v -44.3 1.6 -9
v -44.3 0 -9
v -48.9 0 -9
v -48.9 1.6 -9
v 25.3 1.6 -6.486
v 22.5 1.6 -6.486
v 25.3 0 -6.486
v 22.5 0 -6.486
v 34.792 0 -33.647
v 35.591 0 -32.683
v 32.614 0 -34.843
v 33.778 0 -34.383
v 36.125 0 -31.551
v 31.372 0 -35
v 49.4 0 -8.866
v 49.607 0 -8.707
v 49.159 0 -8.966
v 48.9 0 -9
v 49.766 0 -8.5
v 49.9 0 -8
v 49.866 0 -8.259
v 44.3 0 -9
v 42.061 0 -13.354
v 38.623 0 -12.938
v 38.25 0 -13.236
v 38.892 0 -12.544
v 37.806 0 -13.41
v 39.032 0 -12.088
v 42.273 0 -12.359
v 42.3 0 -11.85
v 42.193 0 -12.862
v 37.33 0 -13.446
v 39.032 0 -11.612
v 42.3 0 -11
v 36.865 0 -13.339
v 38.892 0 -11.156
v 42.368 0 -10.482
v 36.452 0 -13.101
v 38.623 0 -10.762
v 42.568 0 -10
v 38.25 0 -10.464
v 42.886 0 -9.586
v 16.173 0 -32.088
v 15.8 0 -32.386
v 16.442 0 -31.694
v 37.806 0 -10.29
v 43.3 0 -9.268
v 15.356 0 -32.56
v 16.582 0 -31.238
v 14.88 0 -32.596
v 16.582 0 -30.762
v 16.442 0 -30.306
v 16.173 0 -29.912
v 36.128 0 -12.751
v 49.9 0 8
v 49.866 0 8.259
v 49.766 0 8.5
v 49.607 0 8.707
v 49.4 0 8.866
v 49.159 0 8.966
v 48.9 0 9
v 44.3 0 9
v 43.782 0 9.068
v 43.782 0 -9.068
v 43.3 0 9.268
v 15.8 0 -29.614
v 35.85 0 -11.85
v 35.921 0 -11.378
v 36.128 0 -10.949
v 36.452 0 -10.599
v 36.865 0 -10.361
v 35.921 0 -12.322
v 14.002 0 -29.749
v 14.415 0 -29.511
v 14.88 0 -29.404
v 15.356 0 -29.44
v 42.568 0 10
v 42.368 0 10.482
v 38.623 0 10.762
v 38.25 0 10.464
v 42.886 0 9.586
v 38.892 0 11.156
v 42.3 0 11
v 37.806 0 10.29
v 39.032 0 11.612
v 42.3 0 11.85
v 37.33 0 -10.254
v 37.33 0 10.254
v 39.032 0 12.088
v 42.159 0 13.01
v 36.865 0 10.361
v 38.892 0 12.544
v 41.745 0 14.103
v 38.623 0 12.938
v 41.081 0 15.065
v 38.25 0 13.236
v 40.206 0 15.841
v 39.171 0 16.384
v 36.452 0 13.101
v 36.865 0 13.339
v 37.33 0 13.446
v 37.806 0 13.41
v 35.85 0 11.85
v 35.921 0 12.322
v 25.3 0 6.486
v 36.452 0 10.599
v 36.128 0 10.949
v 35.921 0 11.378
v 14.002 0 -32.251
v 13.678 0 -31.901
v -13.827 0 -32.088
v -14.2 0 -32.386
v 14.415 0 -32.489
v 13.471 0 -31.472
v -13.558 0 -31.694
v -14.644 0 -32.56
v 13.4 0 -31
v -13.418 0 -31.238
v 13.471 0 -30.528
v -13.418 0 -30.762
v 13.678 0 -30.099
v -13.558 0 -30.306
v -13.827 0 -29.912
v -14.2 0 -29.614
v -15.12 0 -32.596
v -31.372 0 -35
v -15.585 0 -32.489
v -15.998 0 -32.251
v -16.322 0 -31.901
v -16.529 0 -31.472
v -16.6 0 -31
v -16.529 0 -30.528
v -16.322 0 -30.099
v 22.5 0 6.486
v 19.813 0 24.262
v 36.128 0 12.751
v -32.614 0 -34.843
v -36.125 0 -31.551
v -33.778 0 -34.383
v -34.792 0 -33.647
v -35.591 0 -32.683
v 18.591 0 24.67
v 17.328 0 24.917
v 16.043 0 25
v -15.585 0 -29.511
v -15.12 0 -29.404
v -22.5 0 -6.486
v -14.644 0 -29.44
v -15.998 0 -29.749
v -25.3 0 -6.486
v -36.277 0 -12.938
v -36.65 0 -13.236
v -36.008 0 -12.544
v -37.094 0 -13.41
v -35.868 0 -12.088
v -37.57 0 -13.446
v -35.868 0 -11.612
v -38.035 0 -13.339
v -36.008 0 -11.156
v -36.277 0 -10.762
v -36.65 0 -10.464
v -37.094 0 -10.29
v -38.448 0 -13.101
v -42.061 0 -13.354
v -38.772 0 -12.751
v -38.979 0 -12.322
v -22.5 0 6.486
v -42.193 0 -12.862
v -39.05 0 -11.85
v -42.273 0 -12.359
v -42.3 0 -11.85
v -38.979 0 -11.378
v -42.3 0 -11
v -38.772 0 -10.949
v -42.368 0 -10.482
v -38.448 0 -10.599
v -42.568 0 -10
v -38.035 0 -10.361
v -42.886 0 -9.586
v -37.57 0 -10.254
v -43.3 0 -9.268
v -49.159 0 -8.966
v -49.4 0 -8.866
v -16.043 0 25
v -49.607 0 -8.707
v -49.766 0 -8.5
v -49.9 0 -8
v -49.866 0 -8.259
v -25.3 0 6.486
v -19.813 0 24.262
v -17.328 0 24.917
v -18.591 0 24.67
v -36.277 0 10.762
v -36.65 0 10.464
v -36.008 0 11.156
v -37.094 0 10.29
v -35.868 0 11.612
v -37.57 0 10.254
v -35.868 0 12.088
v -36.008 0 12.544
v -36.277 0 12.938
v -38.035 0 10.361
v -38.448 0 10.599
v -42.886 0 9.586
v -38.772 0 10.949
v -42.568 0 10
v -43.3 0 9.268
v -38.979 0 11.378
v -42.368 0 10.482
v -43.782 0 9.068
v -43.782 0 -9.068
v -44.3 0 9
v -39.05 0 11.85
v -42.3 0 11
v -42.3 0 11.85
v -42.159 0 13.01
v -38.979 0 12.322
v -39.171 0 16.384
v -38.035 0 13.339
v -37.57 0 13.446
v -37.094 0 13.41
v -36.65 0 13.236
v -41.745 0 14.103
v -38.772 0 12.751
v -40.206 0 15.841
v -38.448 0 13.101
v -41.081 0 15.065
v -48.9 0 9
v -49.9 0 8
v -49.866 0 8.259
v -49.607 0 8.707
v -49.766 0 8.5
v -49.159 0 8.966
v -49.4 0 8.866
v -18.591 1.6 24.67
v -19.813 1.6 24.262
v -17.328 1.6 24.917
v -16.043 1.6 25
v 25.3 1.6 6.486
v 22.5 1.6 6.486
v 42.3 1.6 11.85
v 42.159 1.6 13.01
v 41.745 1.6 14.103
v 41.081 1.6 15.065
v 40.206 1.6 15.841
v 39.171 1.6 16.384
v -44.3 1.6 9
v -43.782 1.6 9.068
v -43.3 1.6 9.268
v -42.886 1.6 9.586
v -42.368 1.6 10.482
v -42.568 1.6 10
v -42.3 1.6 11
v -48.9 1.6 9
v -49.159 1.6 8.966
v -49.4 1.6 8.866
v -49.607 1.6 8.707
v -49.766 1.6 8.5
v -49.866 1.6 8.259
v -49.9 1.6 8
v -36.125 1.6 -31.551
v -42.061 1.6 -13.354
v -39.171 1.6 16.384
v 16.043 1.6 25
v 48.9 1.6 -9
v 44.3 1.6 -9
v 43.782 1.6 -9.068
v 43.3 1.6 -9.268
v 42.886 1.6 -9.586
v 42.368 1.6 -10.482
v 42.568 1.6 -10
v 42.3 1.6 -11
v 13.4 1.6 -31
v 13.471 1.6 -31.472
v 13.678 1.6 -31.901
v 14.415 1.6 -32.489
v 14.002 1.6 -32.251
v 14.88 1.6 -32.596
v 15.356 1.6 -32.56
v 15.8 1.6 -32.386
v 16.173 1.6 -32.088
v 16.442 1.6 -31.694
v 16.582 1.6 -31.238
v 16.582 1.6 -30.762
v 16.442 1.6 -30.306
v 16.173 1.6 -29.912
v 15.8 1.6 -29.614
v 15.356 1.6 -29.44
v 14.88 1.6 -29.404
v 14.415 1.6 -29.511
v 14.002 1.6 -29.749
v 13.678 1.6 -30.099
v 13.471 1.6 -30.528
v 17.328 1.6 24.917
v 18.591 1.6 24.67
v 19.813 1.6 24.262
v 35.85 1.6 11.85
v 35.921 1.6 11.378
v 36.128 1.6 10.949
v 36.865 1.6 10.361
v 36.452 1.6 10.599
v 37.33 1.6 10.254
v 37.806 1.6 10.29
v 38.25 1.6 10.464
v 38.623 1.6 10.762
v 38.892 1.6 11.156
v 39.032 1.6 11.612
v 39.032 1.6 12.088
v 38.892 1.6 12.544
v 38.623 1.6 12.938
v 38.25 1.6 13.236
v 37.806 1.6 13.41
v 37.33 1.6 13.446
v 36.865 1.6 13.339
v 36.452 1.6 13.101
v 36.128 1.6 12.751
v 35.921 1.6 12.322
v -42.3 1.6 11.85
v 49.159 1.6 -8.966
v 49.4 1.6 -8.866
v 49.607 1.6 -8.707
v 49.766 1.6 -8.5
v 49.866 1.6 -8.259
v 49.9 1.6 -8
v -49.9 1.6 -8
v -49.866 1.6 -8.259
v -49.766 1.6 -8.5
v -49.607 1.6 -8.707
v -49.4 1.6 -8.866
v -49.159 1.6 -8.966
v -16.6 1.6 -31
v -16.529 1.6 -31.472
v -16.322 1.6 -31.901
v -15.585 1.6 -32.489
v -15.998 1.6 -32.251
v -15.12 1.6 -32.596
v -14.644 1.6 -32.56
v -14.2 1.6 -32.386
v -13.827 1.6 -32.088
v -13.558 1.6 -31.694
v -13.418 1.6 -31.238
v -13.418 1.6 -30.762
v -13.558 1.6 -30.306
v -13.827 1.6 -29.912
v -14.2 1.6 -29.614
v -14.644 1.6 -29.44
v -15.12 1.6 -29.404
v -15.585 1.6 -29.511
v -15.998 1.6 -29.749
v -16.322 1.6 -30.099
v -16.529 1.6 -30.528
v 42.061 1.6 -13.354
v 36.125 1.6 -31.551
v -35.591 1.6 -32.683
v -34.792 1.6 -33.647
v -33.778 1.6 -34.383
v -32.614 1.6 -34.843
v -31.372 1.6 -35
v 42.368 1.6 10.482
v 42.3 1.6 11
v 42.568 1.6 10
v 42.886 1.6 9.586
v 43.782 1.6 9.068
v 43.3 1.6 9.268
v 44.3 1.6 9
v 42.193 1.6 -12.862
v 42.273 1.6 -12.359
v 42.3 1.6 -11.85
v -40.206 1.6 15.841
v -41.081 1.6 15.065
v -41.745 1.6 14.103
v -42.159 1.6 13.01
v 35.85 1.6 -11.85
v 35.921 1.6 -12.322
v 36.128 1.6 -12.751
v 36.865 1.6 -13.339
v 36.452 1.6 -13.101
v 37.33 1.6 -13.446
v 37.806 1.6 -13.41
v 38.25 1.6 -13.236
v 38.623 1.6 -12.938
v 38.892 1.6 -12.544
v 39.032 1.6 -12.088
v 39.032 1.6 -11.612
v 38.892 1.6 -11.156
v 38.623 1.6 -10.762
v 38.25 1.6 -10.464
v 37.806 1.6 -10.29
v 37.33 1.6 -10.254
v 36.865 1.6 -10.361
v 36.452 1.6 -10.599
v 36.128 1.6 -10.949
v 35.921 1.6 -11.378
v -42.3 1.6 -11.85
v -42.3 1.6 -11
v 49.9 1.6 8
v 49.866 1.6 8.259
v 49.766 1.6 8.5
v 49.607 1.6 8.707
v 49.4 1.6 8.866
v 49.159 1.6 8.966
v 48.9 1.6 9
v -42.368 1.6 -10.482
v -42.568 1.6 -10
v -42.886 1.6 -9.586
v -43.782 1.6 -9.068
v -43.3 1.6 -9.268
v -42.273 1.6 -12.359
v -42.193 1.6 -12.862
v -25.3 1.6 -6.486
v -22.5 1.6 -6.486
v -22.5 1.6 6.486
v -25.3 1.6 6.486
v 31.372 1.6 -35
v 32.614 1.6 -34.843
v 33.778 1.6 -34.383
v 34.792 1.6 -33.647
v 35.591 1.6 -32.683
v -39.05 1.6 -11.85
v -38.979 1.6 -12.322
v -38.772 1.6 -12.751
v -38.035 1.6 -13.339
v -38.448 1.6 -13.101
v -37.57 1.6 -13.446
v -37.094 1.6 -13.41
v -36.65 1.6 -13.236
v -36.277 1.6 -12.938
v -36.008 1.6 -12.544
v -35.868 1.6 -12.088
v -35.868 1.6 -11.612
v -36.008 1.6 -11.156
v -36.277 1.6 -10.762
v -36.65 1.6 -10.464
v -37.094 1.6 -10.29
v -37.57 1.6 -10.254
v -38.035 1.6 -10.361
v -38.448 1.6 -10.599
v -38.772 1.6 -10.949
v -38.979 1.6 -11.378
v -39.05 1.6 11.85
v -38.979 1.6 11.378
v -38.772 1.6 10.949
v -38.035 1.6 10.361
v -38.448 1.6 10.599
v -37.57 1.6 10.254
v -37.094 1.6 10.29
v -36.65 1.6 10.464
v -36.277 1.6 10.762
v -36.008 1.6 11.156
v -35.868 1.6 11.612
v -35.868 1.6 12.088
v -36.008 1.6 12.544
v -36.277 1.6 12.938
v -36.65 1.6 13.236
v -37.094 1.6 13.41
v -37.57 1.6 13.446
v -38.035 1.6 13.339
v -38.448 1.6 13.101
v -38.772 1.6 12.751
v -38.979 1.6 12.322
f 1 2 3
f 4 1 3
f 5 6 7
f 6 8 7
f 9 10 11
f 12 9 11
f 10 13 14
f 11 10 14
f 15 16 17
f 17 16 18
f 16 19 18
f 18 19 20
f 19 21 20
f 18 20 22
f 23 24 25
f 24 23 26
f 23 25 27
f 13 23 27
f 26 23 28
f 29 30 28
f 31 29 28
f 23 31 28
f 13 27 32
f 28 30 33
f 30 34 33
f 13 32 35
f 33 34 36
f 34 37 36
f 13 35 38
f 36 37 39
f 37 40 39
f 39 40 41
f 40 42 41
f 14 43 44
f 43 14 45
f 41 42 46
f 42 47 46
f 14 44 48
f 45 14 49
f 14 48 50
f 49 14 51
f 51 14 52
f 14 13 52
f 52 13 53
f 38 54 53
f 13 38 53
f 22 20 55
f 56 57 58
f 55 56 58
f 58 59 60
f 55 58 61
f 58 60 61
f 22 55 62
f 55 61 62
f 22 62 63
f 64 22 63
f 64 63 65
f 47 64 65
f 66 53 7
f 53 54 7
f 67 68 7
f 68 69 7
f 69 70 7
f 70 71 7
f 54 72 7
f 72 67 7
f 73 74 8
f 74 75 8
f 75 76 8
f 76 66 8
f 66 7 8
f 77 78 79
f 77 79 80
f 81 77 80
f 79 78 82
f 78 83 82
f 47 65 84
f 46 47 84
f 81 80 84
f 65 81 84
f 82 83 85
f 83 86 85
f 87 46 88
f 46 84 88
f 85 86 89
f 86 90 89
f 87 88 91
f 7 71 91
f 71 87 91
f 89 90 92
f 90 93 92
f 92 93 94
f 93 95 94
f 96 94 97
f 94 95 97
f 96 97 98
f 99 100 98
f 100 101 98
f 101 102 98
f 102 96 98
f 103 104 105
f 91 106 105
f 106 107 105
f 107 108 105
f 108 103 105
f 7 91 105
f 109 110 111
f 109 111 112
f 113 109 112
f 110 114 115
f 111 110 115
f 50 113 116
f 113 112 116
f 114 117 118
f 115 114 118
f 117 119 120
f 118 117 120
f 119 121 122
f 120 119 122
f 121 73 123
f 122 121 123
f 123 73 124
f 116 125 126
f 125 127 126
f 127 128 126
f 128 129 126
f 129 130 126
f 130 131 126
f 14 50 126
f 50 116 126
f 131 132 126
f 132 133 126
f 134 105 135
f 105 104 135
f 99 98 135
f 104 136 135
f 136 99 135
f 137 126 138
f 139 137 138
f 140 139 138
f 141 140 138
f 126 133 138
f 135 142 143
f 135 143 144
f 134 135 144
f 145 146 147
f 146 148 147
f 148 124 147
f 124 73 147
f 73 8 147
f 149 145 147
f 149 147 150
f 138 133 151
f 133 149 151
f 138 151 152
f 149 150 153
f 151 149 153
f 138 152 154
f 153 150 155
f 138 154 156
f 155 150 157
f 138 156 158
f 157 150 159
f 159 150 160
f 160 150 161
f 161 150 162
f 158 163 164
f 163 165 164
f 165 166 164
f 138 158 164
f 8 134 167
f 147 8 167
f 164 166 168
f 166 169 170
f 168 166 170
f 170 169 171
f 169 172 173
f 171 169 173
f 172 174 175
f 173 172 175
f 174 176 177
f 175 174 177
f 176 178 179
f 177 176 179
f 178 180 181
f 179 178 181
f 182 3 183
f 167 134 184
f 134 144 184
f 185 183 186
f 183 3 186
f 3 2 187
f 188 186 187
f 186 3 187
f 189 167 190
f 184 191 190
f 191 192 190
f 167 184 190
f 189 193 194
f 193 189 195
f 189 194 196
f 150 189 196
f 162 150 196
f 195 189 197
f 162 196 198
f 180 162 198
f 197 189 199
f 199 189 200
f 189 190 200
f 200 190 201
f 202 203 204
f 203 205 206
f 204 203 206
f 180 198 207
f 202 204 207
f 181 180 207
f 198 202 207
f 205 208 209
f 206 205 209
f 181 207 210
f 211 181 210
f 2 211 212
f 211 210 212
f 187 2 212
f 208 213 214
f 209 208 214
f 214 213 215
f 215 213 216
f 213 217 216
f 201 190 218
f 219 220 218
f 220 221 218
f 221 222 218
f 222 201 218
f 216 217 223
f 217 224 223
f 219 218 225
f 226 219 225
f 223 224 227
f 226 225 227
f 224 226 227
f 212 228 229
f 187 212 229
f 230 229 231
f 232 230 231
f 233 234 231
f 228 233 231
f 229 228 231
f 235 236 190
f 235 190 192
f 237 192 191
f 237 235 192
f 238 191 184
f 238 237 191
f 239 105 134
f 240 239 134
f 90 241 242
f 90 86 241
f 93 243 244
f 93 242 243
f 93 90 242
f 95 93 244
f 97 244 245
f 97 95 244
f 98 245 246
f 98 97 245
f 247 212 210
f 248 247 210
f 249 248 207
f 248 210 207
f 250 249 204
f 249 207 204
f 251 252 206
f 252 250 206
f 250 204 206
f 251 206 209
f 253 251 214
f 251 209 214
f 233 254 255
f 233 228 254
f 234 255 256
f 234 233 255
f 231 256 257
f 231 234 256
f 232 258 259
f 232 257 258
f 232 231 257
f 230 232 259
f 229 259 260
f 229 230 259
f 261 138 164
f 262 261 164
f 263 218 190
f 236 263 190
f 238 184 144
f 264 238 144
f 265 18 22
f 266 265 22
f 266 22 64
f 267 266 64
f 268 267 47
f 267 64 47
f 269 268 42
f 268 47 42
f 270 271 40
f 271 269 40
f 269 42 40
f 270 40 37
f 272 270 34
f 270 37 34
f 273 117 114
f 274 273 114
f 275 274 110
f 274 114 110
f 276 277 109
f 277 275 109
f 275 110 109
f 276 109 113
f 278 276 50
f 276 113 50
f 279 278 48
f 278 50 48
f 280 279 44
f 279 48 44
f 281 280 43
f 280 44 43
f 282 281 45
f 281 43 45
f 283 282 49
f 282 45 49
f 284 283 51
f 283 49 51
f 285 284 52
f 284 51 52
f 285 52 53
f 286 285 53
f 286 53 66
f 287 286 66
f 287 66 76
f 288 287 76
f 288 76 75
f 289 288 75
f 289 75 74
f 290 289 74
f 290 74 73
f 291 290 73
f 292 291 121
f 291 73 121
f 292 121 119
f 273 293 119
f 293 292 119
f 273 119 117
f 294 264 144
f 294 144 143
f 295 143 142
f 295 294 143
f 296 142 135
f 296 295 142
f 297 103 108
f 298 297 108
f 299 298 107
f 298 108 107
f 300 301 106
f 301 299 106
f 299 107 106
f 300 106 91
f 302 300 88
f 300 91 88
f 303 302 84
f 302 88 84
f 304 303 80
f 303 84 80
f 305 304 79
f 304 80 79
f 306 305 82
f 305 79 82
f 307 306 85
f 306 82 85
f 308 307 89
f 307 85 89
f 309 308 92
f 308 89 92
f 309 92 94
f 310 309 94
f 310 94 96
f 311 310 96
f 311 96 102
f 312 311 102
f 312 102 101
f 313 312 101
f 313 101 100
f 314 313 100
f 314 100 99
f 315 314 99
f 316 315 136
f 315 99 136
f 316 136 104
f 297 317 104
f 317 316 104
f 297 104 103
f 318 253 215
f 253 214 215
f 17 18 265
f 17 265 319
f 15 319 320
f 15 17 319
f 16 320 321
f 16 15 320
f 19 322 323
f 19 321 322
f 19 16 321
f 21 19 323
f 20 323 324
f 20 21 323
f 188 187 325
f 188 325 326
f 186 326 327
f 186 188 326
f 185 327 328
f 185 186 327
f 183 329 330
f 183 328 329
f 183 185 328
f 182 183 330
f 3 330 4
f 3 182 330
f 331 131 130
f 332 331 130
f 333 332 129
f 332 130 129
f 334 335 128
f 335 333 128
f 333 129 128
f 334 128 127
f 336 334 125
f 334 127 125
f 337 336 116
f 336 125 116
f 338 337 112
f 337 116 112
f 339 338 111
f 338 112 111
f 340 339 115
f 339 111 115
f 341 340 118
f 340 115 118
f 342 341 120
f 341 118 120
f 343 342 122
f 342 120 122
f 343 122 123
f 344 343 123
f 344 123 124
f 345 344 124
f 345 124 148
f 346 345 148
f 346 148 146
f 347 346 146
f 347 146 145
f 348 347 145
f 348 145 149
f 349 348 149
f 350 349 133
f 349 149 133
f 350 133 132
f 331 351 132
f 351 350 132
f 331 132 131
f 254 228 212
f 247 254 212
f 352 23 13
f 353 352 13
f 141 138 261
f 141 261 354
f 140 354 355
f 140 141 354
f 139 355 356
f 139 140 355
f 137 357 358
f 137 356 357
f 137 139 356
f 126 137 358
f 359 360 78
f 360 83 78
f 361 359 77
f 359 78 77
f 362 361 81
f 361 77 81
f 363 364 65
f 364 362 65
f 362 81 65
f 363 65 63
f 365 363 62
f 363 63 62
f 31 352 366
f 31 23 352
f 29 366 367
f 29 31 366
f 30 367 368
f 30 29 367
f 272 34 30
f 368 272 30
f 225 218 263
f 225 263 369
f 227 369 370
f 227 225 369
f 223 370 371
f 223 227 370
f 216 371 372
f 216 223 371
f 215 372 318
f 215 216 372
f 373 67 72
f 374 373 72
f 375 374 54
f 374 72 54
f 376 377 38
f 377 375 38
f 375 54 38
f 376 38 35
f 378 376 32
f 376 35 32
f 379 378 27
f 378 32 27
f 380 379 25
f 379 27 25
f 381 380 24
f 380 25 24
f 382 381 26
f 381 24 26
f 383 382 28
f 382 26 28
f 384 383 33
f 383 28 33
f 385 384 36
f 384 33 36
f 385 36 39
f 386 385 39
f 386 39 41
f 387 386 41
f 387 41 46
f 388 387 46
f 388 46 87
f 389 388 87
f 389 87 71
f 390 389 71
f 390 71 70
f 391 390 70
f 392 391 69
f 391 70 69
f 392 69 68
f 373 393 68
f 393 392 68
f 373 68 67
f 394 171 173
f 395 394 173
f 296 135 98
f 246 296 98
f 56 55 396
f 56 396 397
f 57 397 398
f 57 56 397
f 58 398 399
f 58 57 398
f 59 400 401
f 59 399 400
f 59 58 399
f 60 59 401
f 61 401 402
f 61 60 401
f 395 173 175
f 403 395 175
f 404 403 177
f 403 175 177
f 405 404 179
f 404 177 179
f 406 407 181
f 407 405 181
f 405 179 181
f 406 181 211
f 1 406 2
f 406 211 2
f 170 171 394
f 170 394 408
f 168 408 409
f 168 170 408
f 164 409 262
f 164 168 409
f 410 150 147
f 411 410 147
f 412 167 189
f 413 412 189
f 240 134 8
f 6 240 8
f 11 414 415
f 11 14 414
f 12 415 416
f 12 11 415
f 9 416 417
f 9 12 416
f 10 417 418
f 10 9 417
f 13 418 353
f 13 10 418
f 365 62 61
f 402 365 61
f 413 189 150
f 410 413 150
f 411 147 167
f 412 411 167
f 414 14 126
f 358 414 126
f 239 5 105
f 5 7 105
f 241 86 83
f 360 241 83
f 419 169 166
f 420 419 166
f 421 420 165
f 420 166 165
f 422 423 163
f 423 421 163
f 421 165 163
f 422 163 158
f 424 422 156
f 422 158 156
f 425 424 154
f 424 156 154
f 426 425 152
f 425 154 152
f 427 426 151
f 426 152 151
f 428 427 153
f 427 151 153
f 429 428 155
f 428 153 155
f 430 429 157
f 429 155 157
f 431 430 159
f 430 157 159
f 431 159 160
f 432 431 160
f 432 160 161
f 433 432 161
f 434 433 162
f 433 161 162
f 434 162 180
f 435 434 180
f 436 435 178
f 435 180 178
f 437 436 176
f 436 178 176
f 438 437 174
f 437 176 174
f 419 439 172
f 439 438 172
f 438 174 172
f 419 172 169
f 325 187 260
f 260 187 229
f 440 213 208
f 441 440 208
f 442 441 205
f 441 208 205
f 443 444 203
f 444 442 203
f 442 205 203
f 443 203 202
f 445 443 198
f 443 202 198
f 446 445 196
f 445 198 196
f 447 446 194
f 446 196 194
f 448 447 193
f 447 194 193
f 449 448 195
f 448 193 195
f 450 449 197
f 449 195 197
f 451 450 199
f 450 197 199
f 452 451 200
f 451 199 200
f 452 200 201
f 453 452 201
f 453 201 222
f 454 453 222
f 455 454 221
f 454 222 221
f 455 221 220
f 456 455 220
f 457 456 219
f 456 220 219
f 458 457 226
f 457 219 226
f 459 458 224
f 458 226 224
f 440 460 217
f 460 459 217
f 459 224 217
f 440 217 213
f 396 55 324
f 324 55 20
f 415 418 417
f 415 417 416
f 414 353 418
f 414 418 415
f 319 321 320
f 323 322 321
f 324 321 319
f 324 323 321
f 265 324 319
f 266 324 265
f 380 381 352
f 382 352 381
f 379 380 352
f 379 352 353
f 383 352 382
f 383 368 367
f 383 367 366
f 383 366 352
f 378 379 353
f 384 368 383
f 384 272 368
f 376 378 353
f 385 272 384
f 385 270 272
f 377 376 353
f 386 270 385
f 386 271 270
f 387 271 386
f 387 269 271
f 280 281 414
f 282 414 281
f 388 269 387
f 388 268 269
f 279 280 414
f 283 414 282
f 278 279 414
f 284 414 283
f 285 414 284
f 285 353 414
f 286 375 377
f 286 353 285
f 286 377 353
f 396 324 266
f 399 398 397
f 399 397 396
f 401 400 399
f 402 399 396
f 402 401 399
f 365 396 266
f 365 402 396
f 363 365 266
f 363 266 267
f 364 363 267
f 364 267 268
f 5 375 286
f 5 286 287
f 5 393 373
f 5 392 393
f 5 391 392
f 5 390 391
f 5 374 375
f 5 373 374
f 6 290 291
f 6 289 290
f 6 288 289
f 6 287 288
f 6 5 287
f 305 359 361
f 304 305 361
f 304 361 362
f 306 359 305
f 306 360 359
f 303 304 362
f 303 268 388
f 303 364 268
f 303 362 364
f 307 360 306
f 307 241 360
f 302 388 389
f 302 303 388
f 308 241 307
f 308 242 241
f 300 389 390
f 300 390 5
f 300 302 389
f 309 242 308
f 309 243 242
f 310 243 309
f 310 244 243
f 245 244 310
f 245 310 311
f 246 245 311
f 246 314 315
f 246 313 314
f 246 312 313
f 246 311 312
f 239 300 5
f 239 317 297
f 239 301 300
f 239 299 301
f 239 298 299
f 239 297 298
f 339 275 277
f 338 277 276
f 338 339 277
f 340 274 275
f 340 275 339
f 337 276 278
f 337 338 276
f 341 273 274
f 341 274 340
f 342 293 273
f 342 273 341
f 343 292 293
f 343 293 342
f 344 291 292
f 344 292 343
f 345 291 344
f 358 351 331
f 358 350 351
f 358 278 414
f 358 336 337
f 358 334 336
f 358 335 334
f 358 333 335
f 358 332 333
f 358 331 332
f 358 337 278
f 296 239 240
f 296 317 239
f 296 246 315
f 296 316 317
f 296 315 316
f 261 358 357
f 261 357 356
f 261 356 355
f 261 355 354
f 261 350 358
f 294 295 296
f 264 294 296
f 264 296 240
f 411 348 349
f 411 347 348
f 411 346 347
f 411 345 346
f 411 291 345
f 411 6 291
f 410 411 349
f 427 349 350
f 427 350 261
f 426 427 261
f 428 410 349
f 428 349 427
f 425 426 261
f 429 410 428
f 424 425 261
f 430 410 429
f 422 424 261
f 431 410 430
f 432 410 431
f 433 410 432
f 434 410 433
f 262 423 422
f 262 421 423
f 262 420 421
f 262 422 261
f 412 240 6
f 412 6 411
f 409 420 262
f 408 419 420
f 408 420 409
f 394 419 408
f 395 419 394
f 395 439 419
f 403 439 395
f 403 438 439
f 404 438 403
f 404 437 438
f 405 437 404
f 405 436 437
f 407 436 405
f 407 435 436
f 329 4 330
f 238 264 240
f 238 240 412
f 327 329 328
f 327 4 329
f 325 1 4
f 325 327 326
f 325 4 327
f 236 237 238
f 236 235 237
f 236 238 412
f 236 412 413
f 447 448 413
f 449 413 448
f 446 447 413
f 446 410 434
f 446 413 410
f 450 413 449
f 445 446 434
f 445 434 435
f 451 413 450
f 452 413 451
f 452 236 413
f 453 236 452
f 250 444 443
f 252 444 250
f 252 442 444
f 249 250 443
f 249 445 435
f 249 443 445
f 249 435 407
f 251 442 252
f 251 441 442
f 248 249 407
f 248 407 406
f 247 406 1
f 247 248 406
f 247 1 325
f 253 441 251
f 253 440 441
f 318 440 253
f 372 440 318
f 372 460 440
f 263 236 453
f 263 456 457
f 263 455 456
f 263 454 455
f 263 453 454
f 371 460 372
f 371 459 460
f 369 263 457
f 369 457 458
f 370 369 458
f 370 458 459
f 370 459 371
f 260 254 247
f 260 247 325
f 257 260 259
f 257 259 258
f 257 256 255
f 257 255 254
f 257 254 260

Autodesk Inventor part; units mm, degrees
ref_plane "YZ Plane" through (0, 0, 0) normal (1, 0, 0) x (0, 1, 0)
ref_plane "XZ Plane" through (0, 0, 0) normal (0, 1, 0) x (-1, 0, 0)
ref_plane "XY Plane" through (0, 0, 0) normal (0, 0, 1) x (1, 0, 0)
sketch "Szkic1" plane through (0, 0, 0) normal (0, 1, 0) x (-1, 0, 0)
  arc A0 (49.9, 8) -> (48.9, 9) centre (48.9, 8) ccw
  line L0 (48.9, 9) -> (44.3, 9)
  arc A1 (42.3, 11) -> (44.3, 9) centre (44.3, 11) ccw
  line L1 (42.3, 11) -> (42.3, 11.85)
  arc A2 (42.3, 11.85) -> (39.1714, 16.3842) centre (37.45, 11.85) ccw
  line L2 (39.1714, 16.3842) -> (18, 25)
  line L3 (18, 25) -> (-18, 25)
  line L4 (-18, 25) -> (-39.1714, 16.3842)
  arc A3 (-39.1714, 16.3842) -> (-42.3, 11.85) centre (-37.45, 11.85) ccw
  line L5 (-42.3, 11.85) -> (-42.3, 11)
  arc A4 (-44.3, 9) -> (-42.3, 11) centre (-44.3, 11) ccw
  line L6 (-44.3, 9) -> (-48.9, 9)
  arc A5 (-48.9, 9) -> (-49.9, 8) centre (-48.9, 8) ccw
  line L7 (-49.9, 8) -> (-49.9, -8)
  arc A6 (-49.9, -8) -> (-48.9, -9) centre (-48.9, -8) ccw
  line L8 (-48.9, -9) -> (-44.3, -9)
  arc A7 (-42.3, -11) -> (-44.3, -9) centre (-44.3, -11) ccw
  line L9 (-42.3, -11) -> (-42.3, -11.85)
  arc A8 (-42.3, -11.85) -> (-42.0609, -13.3541) centre (-37.45, -11.85) ccw
  line L10 (-42.0609, -13.3541) -> (-36.1252, -31.5506)
  arc A9 (-36.1252, -31.5506) -> (-31.3717, -35) centre (-31.3717, -30) ccw
  line L11 (-31.3717, -35) -> (31.3717, -35)
  arc A10 (31.3717, -35) -> (36.1252, -31.5506) centre (31.3717, -30) ccw
  line L12 (36.1252, -31.5506) -> (42.0609, -13.3541)
  arc A11 (42.0609, -13.3541) -> (42.3, -11.85) centre (37.45, -11.85) ccw
  line L13 (42.3, -11.85) -> (42.3, -11)
  arc A12 (44.3, -9) -> (42.3, -11) centre (44.3, -11) ccw
  line L14 (44.3, -9) -> (48.9, -9)
  arc A13 (48.9, -9) -> (49.9, -8) centre (48.9, -8) ccw
  line L15 (49.9, -8) -> (49.9, 8)
  line L16 (25.3, -6.4859) -> (22.5, -6.4859)
  line L17 (22.5, -6.4859) -> (22.5, 6.4859)
  line L18 (22.5, 6.4859) -> (25.3, 6.4859)
  line L19 (25.3, 6.4859) -> (25.3, -6.4859)
  circle A14 centre (37.45, 11.85) radius 1.6
  circle A15 centre (37.45, -11.85) radius 1.6
  circle A16 centre (15, -31) radius 1.6
  circle A17 centre (-15, -31) radius 1.6
  circle A18 centre (-37.45, 11.85) radius 1.6
  circle A19 centre (-37.45, -11.85) radius 1.6
  line L20 (-25.3, -6.4859) -> (-25.3, 6.4859)
  line L21 (-25.3, 6.4859) -> (-22.5, 6.4859)
  line L22 (-22.5, 6.4859) -> (-22.5, -6.4859)
  line L23 (-22.5, -6.4859) -> (-25.3, -6.4859)
  point P0 (0, 0)
  point P1 (0, 0)
  point P2 (0, -35)
  point P3 (0, 25)
  dimension "d0" = 36
  dimension "d1" = 60
extrude "Wyciągnięcie proste1" add sketch "Szkic1" along normal blind 1.6
fillet "Zaokrąglenie1" radius 10 2 edges at (-18, 0.8, 25) (18, 0.8, 25)
sketch "Szkic2" plane through (0, 1.6, 0) normal (0, 1, 0) x (1, 0, 0)
  arc A0 (16.0432, -25) -> (19.8125, -24.2624) centre (16.0432, -15) ccw projected
  line L0 (19.8125, -24.2624) -> (39.1714, -16.3842) projected
  arc A1 (39.1714, -16.3842) -> (42.3, -11.85) centre (37.45, -11.85) ccw projected
  line L1 (42.3, -11.85) -> (42.3, -11) projected
  arc A2 (44.3, -9) -> (42.3, -11) centre (44.3, -11) ccw projected
  line L2 (44.3, -9) -> (48.9, -9) projected
  arc A3 (48.9, -9) -> (49.9, -8) centre (48.9, -8) ccw projected
  line L3 (49.9, -8) -> (49.9, 8) projected
  arc A4 (49.9, 8) -> (48.9, 9) centre (48.9, 8) ccw projected
  line L4 (48.9, 9) -> (44.3, 9) projected
  arc A5 (42.3, 11) -> (44.3, 9) centre (44.3, 11) ccw projected
  line L5 (42.3, 11) -> (42.3, 11.85) projected
  arc A6 (42.3, 11.85) -> (42.0609, 13.3541) centre (37.45, 11.85) ccw projected
  line L6 (42.0609, 13.3541) -> (36.1252, 31.5506) projected
  arc A7 (36.1252, 31.5506) -> (31.3717, 35) centre (31.3717, 30) ccw projected
  line L7 (31.3717, 35) -> (-31.3717, 35) projected
  arc A8 (-31.3717, 35) -> (-36.1252, 31.5506) centre (-31.3717, 30) ccw projected
  line L8 (-36.1252, 31.5506) -> (-42.0609, 13.3541) projected
  arc A9 (-42.0609, 13.3541) -> (-42.3, 11.85) centre (-37.45, 11.85) ccw projected
  line L9 (-42.3, 11.85) -> (-42.3, 11) projected
  arc A10 (-44.3, 9) -> (-42.3, 11) centre (-44.3, 11) ccw projected
  line L10 (-44.3, 9) -> (-48.9, 9) projected
  arc A11 (-48.9, 9) -> (-49.9, 8) centre (-48.9, 8) ccw projected
  line L11 (-49.9, 8) -> (-49.9, -8) projected
  arc A12 (-49.9, -8) -> (-48.9, -9) centre (-48.9, -8) ccw projected
  line L12 (-48.9, -9) -> (-44.3, -9) projected
  arc A13 (-42.3, -11) -> (-44.3, -9) centre (-44.3, -11) ccw projected
  line L13 (-42.3, -11) -> (-42.3, -11.85) projected
  arc A14 (-42.3, -11.85) -> (-39.1714, -16.3842) centre (-37.45, -11.85) ccw projected
  line L14 (-39.1714, -16.3842) -> (-19.8125, -24.2624) projected
  arc A15 (-19.8125, -24.2624) -> (-16.0432, -25) centre (-16.0432, -15) ccw projected
  line L15 (-16.0432, -25) -> (16.0432, -25) projected
  circle A16 centre (-37.45, -11.85) radius 1.6 projected
  circle A17 centre (37.45, -11.85) radius 1.6 projected
  circle A18 centre (15, 31) radius 1.6 projected
  circle A19 centre (-15, 31) radius 1.6 projected
  circle A20 centre (-37.45, 11.85) radius 1.6 projected
  circle A21 centre (37.45, 11.85) radius 1.6 projected
  line L16 (22.5, -6.4859) -> (22.5, 6.4859) projected
  line L17 (22.5, 6.4859) -> (25.3, 6.4859) projected
  line L18 (25.3, 6.4859) -> (25.3, -6.4859) projected
  line L19 (25.3, -6.4859) -> (22.5, -6.4859) projected
  line L20 (-22.5, -6.4859) -> (-25.3, -6.4859) projected
  line L21 (-25.3, -6.4859) -> (-25.3, 6.4859) projected
  line L22 (-25.3, 6.4859) -> (-22.5, 6.4859) projected
  line L23 (-22.5, 6.4859) -> (-22.5, -6.4859) projected
  point P0 (0, 0)
properties part number "plytka_glowna_v3"
